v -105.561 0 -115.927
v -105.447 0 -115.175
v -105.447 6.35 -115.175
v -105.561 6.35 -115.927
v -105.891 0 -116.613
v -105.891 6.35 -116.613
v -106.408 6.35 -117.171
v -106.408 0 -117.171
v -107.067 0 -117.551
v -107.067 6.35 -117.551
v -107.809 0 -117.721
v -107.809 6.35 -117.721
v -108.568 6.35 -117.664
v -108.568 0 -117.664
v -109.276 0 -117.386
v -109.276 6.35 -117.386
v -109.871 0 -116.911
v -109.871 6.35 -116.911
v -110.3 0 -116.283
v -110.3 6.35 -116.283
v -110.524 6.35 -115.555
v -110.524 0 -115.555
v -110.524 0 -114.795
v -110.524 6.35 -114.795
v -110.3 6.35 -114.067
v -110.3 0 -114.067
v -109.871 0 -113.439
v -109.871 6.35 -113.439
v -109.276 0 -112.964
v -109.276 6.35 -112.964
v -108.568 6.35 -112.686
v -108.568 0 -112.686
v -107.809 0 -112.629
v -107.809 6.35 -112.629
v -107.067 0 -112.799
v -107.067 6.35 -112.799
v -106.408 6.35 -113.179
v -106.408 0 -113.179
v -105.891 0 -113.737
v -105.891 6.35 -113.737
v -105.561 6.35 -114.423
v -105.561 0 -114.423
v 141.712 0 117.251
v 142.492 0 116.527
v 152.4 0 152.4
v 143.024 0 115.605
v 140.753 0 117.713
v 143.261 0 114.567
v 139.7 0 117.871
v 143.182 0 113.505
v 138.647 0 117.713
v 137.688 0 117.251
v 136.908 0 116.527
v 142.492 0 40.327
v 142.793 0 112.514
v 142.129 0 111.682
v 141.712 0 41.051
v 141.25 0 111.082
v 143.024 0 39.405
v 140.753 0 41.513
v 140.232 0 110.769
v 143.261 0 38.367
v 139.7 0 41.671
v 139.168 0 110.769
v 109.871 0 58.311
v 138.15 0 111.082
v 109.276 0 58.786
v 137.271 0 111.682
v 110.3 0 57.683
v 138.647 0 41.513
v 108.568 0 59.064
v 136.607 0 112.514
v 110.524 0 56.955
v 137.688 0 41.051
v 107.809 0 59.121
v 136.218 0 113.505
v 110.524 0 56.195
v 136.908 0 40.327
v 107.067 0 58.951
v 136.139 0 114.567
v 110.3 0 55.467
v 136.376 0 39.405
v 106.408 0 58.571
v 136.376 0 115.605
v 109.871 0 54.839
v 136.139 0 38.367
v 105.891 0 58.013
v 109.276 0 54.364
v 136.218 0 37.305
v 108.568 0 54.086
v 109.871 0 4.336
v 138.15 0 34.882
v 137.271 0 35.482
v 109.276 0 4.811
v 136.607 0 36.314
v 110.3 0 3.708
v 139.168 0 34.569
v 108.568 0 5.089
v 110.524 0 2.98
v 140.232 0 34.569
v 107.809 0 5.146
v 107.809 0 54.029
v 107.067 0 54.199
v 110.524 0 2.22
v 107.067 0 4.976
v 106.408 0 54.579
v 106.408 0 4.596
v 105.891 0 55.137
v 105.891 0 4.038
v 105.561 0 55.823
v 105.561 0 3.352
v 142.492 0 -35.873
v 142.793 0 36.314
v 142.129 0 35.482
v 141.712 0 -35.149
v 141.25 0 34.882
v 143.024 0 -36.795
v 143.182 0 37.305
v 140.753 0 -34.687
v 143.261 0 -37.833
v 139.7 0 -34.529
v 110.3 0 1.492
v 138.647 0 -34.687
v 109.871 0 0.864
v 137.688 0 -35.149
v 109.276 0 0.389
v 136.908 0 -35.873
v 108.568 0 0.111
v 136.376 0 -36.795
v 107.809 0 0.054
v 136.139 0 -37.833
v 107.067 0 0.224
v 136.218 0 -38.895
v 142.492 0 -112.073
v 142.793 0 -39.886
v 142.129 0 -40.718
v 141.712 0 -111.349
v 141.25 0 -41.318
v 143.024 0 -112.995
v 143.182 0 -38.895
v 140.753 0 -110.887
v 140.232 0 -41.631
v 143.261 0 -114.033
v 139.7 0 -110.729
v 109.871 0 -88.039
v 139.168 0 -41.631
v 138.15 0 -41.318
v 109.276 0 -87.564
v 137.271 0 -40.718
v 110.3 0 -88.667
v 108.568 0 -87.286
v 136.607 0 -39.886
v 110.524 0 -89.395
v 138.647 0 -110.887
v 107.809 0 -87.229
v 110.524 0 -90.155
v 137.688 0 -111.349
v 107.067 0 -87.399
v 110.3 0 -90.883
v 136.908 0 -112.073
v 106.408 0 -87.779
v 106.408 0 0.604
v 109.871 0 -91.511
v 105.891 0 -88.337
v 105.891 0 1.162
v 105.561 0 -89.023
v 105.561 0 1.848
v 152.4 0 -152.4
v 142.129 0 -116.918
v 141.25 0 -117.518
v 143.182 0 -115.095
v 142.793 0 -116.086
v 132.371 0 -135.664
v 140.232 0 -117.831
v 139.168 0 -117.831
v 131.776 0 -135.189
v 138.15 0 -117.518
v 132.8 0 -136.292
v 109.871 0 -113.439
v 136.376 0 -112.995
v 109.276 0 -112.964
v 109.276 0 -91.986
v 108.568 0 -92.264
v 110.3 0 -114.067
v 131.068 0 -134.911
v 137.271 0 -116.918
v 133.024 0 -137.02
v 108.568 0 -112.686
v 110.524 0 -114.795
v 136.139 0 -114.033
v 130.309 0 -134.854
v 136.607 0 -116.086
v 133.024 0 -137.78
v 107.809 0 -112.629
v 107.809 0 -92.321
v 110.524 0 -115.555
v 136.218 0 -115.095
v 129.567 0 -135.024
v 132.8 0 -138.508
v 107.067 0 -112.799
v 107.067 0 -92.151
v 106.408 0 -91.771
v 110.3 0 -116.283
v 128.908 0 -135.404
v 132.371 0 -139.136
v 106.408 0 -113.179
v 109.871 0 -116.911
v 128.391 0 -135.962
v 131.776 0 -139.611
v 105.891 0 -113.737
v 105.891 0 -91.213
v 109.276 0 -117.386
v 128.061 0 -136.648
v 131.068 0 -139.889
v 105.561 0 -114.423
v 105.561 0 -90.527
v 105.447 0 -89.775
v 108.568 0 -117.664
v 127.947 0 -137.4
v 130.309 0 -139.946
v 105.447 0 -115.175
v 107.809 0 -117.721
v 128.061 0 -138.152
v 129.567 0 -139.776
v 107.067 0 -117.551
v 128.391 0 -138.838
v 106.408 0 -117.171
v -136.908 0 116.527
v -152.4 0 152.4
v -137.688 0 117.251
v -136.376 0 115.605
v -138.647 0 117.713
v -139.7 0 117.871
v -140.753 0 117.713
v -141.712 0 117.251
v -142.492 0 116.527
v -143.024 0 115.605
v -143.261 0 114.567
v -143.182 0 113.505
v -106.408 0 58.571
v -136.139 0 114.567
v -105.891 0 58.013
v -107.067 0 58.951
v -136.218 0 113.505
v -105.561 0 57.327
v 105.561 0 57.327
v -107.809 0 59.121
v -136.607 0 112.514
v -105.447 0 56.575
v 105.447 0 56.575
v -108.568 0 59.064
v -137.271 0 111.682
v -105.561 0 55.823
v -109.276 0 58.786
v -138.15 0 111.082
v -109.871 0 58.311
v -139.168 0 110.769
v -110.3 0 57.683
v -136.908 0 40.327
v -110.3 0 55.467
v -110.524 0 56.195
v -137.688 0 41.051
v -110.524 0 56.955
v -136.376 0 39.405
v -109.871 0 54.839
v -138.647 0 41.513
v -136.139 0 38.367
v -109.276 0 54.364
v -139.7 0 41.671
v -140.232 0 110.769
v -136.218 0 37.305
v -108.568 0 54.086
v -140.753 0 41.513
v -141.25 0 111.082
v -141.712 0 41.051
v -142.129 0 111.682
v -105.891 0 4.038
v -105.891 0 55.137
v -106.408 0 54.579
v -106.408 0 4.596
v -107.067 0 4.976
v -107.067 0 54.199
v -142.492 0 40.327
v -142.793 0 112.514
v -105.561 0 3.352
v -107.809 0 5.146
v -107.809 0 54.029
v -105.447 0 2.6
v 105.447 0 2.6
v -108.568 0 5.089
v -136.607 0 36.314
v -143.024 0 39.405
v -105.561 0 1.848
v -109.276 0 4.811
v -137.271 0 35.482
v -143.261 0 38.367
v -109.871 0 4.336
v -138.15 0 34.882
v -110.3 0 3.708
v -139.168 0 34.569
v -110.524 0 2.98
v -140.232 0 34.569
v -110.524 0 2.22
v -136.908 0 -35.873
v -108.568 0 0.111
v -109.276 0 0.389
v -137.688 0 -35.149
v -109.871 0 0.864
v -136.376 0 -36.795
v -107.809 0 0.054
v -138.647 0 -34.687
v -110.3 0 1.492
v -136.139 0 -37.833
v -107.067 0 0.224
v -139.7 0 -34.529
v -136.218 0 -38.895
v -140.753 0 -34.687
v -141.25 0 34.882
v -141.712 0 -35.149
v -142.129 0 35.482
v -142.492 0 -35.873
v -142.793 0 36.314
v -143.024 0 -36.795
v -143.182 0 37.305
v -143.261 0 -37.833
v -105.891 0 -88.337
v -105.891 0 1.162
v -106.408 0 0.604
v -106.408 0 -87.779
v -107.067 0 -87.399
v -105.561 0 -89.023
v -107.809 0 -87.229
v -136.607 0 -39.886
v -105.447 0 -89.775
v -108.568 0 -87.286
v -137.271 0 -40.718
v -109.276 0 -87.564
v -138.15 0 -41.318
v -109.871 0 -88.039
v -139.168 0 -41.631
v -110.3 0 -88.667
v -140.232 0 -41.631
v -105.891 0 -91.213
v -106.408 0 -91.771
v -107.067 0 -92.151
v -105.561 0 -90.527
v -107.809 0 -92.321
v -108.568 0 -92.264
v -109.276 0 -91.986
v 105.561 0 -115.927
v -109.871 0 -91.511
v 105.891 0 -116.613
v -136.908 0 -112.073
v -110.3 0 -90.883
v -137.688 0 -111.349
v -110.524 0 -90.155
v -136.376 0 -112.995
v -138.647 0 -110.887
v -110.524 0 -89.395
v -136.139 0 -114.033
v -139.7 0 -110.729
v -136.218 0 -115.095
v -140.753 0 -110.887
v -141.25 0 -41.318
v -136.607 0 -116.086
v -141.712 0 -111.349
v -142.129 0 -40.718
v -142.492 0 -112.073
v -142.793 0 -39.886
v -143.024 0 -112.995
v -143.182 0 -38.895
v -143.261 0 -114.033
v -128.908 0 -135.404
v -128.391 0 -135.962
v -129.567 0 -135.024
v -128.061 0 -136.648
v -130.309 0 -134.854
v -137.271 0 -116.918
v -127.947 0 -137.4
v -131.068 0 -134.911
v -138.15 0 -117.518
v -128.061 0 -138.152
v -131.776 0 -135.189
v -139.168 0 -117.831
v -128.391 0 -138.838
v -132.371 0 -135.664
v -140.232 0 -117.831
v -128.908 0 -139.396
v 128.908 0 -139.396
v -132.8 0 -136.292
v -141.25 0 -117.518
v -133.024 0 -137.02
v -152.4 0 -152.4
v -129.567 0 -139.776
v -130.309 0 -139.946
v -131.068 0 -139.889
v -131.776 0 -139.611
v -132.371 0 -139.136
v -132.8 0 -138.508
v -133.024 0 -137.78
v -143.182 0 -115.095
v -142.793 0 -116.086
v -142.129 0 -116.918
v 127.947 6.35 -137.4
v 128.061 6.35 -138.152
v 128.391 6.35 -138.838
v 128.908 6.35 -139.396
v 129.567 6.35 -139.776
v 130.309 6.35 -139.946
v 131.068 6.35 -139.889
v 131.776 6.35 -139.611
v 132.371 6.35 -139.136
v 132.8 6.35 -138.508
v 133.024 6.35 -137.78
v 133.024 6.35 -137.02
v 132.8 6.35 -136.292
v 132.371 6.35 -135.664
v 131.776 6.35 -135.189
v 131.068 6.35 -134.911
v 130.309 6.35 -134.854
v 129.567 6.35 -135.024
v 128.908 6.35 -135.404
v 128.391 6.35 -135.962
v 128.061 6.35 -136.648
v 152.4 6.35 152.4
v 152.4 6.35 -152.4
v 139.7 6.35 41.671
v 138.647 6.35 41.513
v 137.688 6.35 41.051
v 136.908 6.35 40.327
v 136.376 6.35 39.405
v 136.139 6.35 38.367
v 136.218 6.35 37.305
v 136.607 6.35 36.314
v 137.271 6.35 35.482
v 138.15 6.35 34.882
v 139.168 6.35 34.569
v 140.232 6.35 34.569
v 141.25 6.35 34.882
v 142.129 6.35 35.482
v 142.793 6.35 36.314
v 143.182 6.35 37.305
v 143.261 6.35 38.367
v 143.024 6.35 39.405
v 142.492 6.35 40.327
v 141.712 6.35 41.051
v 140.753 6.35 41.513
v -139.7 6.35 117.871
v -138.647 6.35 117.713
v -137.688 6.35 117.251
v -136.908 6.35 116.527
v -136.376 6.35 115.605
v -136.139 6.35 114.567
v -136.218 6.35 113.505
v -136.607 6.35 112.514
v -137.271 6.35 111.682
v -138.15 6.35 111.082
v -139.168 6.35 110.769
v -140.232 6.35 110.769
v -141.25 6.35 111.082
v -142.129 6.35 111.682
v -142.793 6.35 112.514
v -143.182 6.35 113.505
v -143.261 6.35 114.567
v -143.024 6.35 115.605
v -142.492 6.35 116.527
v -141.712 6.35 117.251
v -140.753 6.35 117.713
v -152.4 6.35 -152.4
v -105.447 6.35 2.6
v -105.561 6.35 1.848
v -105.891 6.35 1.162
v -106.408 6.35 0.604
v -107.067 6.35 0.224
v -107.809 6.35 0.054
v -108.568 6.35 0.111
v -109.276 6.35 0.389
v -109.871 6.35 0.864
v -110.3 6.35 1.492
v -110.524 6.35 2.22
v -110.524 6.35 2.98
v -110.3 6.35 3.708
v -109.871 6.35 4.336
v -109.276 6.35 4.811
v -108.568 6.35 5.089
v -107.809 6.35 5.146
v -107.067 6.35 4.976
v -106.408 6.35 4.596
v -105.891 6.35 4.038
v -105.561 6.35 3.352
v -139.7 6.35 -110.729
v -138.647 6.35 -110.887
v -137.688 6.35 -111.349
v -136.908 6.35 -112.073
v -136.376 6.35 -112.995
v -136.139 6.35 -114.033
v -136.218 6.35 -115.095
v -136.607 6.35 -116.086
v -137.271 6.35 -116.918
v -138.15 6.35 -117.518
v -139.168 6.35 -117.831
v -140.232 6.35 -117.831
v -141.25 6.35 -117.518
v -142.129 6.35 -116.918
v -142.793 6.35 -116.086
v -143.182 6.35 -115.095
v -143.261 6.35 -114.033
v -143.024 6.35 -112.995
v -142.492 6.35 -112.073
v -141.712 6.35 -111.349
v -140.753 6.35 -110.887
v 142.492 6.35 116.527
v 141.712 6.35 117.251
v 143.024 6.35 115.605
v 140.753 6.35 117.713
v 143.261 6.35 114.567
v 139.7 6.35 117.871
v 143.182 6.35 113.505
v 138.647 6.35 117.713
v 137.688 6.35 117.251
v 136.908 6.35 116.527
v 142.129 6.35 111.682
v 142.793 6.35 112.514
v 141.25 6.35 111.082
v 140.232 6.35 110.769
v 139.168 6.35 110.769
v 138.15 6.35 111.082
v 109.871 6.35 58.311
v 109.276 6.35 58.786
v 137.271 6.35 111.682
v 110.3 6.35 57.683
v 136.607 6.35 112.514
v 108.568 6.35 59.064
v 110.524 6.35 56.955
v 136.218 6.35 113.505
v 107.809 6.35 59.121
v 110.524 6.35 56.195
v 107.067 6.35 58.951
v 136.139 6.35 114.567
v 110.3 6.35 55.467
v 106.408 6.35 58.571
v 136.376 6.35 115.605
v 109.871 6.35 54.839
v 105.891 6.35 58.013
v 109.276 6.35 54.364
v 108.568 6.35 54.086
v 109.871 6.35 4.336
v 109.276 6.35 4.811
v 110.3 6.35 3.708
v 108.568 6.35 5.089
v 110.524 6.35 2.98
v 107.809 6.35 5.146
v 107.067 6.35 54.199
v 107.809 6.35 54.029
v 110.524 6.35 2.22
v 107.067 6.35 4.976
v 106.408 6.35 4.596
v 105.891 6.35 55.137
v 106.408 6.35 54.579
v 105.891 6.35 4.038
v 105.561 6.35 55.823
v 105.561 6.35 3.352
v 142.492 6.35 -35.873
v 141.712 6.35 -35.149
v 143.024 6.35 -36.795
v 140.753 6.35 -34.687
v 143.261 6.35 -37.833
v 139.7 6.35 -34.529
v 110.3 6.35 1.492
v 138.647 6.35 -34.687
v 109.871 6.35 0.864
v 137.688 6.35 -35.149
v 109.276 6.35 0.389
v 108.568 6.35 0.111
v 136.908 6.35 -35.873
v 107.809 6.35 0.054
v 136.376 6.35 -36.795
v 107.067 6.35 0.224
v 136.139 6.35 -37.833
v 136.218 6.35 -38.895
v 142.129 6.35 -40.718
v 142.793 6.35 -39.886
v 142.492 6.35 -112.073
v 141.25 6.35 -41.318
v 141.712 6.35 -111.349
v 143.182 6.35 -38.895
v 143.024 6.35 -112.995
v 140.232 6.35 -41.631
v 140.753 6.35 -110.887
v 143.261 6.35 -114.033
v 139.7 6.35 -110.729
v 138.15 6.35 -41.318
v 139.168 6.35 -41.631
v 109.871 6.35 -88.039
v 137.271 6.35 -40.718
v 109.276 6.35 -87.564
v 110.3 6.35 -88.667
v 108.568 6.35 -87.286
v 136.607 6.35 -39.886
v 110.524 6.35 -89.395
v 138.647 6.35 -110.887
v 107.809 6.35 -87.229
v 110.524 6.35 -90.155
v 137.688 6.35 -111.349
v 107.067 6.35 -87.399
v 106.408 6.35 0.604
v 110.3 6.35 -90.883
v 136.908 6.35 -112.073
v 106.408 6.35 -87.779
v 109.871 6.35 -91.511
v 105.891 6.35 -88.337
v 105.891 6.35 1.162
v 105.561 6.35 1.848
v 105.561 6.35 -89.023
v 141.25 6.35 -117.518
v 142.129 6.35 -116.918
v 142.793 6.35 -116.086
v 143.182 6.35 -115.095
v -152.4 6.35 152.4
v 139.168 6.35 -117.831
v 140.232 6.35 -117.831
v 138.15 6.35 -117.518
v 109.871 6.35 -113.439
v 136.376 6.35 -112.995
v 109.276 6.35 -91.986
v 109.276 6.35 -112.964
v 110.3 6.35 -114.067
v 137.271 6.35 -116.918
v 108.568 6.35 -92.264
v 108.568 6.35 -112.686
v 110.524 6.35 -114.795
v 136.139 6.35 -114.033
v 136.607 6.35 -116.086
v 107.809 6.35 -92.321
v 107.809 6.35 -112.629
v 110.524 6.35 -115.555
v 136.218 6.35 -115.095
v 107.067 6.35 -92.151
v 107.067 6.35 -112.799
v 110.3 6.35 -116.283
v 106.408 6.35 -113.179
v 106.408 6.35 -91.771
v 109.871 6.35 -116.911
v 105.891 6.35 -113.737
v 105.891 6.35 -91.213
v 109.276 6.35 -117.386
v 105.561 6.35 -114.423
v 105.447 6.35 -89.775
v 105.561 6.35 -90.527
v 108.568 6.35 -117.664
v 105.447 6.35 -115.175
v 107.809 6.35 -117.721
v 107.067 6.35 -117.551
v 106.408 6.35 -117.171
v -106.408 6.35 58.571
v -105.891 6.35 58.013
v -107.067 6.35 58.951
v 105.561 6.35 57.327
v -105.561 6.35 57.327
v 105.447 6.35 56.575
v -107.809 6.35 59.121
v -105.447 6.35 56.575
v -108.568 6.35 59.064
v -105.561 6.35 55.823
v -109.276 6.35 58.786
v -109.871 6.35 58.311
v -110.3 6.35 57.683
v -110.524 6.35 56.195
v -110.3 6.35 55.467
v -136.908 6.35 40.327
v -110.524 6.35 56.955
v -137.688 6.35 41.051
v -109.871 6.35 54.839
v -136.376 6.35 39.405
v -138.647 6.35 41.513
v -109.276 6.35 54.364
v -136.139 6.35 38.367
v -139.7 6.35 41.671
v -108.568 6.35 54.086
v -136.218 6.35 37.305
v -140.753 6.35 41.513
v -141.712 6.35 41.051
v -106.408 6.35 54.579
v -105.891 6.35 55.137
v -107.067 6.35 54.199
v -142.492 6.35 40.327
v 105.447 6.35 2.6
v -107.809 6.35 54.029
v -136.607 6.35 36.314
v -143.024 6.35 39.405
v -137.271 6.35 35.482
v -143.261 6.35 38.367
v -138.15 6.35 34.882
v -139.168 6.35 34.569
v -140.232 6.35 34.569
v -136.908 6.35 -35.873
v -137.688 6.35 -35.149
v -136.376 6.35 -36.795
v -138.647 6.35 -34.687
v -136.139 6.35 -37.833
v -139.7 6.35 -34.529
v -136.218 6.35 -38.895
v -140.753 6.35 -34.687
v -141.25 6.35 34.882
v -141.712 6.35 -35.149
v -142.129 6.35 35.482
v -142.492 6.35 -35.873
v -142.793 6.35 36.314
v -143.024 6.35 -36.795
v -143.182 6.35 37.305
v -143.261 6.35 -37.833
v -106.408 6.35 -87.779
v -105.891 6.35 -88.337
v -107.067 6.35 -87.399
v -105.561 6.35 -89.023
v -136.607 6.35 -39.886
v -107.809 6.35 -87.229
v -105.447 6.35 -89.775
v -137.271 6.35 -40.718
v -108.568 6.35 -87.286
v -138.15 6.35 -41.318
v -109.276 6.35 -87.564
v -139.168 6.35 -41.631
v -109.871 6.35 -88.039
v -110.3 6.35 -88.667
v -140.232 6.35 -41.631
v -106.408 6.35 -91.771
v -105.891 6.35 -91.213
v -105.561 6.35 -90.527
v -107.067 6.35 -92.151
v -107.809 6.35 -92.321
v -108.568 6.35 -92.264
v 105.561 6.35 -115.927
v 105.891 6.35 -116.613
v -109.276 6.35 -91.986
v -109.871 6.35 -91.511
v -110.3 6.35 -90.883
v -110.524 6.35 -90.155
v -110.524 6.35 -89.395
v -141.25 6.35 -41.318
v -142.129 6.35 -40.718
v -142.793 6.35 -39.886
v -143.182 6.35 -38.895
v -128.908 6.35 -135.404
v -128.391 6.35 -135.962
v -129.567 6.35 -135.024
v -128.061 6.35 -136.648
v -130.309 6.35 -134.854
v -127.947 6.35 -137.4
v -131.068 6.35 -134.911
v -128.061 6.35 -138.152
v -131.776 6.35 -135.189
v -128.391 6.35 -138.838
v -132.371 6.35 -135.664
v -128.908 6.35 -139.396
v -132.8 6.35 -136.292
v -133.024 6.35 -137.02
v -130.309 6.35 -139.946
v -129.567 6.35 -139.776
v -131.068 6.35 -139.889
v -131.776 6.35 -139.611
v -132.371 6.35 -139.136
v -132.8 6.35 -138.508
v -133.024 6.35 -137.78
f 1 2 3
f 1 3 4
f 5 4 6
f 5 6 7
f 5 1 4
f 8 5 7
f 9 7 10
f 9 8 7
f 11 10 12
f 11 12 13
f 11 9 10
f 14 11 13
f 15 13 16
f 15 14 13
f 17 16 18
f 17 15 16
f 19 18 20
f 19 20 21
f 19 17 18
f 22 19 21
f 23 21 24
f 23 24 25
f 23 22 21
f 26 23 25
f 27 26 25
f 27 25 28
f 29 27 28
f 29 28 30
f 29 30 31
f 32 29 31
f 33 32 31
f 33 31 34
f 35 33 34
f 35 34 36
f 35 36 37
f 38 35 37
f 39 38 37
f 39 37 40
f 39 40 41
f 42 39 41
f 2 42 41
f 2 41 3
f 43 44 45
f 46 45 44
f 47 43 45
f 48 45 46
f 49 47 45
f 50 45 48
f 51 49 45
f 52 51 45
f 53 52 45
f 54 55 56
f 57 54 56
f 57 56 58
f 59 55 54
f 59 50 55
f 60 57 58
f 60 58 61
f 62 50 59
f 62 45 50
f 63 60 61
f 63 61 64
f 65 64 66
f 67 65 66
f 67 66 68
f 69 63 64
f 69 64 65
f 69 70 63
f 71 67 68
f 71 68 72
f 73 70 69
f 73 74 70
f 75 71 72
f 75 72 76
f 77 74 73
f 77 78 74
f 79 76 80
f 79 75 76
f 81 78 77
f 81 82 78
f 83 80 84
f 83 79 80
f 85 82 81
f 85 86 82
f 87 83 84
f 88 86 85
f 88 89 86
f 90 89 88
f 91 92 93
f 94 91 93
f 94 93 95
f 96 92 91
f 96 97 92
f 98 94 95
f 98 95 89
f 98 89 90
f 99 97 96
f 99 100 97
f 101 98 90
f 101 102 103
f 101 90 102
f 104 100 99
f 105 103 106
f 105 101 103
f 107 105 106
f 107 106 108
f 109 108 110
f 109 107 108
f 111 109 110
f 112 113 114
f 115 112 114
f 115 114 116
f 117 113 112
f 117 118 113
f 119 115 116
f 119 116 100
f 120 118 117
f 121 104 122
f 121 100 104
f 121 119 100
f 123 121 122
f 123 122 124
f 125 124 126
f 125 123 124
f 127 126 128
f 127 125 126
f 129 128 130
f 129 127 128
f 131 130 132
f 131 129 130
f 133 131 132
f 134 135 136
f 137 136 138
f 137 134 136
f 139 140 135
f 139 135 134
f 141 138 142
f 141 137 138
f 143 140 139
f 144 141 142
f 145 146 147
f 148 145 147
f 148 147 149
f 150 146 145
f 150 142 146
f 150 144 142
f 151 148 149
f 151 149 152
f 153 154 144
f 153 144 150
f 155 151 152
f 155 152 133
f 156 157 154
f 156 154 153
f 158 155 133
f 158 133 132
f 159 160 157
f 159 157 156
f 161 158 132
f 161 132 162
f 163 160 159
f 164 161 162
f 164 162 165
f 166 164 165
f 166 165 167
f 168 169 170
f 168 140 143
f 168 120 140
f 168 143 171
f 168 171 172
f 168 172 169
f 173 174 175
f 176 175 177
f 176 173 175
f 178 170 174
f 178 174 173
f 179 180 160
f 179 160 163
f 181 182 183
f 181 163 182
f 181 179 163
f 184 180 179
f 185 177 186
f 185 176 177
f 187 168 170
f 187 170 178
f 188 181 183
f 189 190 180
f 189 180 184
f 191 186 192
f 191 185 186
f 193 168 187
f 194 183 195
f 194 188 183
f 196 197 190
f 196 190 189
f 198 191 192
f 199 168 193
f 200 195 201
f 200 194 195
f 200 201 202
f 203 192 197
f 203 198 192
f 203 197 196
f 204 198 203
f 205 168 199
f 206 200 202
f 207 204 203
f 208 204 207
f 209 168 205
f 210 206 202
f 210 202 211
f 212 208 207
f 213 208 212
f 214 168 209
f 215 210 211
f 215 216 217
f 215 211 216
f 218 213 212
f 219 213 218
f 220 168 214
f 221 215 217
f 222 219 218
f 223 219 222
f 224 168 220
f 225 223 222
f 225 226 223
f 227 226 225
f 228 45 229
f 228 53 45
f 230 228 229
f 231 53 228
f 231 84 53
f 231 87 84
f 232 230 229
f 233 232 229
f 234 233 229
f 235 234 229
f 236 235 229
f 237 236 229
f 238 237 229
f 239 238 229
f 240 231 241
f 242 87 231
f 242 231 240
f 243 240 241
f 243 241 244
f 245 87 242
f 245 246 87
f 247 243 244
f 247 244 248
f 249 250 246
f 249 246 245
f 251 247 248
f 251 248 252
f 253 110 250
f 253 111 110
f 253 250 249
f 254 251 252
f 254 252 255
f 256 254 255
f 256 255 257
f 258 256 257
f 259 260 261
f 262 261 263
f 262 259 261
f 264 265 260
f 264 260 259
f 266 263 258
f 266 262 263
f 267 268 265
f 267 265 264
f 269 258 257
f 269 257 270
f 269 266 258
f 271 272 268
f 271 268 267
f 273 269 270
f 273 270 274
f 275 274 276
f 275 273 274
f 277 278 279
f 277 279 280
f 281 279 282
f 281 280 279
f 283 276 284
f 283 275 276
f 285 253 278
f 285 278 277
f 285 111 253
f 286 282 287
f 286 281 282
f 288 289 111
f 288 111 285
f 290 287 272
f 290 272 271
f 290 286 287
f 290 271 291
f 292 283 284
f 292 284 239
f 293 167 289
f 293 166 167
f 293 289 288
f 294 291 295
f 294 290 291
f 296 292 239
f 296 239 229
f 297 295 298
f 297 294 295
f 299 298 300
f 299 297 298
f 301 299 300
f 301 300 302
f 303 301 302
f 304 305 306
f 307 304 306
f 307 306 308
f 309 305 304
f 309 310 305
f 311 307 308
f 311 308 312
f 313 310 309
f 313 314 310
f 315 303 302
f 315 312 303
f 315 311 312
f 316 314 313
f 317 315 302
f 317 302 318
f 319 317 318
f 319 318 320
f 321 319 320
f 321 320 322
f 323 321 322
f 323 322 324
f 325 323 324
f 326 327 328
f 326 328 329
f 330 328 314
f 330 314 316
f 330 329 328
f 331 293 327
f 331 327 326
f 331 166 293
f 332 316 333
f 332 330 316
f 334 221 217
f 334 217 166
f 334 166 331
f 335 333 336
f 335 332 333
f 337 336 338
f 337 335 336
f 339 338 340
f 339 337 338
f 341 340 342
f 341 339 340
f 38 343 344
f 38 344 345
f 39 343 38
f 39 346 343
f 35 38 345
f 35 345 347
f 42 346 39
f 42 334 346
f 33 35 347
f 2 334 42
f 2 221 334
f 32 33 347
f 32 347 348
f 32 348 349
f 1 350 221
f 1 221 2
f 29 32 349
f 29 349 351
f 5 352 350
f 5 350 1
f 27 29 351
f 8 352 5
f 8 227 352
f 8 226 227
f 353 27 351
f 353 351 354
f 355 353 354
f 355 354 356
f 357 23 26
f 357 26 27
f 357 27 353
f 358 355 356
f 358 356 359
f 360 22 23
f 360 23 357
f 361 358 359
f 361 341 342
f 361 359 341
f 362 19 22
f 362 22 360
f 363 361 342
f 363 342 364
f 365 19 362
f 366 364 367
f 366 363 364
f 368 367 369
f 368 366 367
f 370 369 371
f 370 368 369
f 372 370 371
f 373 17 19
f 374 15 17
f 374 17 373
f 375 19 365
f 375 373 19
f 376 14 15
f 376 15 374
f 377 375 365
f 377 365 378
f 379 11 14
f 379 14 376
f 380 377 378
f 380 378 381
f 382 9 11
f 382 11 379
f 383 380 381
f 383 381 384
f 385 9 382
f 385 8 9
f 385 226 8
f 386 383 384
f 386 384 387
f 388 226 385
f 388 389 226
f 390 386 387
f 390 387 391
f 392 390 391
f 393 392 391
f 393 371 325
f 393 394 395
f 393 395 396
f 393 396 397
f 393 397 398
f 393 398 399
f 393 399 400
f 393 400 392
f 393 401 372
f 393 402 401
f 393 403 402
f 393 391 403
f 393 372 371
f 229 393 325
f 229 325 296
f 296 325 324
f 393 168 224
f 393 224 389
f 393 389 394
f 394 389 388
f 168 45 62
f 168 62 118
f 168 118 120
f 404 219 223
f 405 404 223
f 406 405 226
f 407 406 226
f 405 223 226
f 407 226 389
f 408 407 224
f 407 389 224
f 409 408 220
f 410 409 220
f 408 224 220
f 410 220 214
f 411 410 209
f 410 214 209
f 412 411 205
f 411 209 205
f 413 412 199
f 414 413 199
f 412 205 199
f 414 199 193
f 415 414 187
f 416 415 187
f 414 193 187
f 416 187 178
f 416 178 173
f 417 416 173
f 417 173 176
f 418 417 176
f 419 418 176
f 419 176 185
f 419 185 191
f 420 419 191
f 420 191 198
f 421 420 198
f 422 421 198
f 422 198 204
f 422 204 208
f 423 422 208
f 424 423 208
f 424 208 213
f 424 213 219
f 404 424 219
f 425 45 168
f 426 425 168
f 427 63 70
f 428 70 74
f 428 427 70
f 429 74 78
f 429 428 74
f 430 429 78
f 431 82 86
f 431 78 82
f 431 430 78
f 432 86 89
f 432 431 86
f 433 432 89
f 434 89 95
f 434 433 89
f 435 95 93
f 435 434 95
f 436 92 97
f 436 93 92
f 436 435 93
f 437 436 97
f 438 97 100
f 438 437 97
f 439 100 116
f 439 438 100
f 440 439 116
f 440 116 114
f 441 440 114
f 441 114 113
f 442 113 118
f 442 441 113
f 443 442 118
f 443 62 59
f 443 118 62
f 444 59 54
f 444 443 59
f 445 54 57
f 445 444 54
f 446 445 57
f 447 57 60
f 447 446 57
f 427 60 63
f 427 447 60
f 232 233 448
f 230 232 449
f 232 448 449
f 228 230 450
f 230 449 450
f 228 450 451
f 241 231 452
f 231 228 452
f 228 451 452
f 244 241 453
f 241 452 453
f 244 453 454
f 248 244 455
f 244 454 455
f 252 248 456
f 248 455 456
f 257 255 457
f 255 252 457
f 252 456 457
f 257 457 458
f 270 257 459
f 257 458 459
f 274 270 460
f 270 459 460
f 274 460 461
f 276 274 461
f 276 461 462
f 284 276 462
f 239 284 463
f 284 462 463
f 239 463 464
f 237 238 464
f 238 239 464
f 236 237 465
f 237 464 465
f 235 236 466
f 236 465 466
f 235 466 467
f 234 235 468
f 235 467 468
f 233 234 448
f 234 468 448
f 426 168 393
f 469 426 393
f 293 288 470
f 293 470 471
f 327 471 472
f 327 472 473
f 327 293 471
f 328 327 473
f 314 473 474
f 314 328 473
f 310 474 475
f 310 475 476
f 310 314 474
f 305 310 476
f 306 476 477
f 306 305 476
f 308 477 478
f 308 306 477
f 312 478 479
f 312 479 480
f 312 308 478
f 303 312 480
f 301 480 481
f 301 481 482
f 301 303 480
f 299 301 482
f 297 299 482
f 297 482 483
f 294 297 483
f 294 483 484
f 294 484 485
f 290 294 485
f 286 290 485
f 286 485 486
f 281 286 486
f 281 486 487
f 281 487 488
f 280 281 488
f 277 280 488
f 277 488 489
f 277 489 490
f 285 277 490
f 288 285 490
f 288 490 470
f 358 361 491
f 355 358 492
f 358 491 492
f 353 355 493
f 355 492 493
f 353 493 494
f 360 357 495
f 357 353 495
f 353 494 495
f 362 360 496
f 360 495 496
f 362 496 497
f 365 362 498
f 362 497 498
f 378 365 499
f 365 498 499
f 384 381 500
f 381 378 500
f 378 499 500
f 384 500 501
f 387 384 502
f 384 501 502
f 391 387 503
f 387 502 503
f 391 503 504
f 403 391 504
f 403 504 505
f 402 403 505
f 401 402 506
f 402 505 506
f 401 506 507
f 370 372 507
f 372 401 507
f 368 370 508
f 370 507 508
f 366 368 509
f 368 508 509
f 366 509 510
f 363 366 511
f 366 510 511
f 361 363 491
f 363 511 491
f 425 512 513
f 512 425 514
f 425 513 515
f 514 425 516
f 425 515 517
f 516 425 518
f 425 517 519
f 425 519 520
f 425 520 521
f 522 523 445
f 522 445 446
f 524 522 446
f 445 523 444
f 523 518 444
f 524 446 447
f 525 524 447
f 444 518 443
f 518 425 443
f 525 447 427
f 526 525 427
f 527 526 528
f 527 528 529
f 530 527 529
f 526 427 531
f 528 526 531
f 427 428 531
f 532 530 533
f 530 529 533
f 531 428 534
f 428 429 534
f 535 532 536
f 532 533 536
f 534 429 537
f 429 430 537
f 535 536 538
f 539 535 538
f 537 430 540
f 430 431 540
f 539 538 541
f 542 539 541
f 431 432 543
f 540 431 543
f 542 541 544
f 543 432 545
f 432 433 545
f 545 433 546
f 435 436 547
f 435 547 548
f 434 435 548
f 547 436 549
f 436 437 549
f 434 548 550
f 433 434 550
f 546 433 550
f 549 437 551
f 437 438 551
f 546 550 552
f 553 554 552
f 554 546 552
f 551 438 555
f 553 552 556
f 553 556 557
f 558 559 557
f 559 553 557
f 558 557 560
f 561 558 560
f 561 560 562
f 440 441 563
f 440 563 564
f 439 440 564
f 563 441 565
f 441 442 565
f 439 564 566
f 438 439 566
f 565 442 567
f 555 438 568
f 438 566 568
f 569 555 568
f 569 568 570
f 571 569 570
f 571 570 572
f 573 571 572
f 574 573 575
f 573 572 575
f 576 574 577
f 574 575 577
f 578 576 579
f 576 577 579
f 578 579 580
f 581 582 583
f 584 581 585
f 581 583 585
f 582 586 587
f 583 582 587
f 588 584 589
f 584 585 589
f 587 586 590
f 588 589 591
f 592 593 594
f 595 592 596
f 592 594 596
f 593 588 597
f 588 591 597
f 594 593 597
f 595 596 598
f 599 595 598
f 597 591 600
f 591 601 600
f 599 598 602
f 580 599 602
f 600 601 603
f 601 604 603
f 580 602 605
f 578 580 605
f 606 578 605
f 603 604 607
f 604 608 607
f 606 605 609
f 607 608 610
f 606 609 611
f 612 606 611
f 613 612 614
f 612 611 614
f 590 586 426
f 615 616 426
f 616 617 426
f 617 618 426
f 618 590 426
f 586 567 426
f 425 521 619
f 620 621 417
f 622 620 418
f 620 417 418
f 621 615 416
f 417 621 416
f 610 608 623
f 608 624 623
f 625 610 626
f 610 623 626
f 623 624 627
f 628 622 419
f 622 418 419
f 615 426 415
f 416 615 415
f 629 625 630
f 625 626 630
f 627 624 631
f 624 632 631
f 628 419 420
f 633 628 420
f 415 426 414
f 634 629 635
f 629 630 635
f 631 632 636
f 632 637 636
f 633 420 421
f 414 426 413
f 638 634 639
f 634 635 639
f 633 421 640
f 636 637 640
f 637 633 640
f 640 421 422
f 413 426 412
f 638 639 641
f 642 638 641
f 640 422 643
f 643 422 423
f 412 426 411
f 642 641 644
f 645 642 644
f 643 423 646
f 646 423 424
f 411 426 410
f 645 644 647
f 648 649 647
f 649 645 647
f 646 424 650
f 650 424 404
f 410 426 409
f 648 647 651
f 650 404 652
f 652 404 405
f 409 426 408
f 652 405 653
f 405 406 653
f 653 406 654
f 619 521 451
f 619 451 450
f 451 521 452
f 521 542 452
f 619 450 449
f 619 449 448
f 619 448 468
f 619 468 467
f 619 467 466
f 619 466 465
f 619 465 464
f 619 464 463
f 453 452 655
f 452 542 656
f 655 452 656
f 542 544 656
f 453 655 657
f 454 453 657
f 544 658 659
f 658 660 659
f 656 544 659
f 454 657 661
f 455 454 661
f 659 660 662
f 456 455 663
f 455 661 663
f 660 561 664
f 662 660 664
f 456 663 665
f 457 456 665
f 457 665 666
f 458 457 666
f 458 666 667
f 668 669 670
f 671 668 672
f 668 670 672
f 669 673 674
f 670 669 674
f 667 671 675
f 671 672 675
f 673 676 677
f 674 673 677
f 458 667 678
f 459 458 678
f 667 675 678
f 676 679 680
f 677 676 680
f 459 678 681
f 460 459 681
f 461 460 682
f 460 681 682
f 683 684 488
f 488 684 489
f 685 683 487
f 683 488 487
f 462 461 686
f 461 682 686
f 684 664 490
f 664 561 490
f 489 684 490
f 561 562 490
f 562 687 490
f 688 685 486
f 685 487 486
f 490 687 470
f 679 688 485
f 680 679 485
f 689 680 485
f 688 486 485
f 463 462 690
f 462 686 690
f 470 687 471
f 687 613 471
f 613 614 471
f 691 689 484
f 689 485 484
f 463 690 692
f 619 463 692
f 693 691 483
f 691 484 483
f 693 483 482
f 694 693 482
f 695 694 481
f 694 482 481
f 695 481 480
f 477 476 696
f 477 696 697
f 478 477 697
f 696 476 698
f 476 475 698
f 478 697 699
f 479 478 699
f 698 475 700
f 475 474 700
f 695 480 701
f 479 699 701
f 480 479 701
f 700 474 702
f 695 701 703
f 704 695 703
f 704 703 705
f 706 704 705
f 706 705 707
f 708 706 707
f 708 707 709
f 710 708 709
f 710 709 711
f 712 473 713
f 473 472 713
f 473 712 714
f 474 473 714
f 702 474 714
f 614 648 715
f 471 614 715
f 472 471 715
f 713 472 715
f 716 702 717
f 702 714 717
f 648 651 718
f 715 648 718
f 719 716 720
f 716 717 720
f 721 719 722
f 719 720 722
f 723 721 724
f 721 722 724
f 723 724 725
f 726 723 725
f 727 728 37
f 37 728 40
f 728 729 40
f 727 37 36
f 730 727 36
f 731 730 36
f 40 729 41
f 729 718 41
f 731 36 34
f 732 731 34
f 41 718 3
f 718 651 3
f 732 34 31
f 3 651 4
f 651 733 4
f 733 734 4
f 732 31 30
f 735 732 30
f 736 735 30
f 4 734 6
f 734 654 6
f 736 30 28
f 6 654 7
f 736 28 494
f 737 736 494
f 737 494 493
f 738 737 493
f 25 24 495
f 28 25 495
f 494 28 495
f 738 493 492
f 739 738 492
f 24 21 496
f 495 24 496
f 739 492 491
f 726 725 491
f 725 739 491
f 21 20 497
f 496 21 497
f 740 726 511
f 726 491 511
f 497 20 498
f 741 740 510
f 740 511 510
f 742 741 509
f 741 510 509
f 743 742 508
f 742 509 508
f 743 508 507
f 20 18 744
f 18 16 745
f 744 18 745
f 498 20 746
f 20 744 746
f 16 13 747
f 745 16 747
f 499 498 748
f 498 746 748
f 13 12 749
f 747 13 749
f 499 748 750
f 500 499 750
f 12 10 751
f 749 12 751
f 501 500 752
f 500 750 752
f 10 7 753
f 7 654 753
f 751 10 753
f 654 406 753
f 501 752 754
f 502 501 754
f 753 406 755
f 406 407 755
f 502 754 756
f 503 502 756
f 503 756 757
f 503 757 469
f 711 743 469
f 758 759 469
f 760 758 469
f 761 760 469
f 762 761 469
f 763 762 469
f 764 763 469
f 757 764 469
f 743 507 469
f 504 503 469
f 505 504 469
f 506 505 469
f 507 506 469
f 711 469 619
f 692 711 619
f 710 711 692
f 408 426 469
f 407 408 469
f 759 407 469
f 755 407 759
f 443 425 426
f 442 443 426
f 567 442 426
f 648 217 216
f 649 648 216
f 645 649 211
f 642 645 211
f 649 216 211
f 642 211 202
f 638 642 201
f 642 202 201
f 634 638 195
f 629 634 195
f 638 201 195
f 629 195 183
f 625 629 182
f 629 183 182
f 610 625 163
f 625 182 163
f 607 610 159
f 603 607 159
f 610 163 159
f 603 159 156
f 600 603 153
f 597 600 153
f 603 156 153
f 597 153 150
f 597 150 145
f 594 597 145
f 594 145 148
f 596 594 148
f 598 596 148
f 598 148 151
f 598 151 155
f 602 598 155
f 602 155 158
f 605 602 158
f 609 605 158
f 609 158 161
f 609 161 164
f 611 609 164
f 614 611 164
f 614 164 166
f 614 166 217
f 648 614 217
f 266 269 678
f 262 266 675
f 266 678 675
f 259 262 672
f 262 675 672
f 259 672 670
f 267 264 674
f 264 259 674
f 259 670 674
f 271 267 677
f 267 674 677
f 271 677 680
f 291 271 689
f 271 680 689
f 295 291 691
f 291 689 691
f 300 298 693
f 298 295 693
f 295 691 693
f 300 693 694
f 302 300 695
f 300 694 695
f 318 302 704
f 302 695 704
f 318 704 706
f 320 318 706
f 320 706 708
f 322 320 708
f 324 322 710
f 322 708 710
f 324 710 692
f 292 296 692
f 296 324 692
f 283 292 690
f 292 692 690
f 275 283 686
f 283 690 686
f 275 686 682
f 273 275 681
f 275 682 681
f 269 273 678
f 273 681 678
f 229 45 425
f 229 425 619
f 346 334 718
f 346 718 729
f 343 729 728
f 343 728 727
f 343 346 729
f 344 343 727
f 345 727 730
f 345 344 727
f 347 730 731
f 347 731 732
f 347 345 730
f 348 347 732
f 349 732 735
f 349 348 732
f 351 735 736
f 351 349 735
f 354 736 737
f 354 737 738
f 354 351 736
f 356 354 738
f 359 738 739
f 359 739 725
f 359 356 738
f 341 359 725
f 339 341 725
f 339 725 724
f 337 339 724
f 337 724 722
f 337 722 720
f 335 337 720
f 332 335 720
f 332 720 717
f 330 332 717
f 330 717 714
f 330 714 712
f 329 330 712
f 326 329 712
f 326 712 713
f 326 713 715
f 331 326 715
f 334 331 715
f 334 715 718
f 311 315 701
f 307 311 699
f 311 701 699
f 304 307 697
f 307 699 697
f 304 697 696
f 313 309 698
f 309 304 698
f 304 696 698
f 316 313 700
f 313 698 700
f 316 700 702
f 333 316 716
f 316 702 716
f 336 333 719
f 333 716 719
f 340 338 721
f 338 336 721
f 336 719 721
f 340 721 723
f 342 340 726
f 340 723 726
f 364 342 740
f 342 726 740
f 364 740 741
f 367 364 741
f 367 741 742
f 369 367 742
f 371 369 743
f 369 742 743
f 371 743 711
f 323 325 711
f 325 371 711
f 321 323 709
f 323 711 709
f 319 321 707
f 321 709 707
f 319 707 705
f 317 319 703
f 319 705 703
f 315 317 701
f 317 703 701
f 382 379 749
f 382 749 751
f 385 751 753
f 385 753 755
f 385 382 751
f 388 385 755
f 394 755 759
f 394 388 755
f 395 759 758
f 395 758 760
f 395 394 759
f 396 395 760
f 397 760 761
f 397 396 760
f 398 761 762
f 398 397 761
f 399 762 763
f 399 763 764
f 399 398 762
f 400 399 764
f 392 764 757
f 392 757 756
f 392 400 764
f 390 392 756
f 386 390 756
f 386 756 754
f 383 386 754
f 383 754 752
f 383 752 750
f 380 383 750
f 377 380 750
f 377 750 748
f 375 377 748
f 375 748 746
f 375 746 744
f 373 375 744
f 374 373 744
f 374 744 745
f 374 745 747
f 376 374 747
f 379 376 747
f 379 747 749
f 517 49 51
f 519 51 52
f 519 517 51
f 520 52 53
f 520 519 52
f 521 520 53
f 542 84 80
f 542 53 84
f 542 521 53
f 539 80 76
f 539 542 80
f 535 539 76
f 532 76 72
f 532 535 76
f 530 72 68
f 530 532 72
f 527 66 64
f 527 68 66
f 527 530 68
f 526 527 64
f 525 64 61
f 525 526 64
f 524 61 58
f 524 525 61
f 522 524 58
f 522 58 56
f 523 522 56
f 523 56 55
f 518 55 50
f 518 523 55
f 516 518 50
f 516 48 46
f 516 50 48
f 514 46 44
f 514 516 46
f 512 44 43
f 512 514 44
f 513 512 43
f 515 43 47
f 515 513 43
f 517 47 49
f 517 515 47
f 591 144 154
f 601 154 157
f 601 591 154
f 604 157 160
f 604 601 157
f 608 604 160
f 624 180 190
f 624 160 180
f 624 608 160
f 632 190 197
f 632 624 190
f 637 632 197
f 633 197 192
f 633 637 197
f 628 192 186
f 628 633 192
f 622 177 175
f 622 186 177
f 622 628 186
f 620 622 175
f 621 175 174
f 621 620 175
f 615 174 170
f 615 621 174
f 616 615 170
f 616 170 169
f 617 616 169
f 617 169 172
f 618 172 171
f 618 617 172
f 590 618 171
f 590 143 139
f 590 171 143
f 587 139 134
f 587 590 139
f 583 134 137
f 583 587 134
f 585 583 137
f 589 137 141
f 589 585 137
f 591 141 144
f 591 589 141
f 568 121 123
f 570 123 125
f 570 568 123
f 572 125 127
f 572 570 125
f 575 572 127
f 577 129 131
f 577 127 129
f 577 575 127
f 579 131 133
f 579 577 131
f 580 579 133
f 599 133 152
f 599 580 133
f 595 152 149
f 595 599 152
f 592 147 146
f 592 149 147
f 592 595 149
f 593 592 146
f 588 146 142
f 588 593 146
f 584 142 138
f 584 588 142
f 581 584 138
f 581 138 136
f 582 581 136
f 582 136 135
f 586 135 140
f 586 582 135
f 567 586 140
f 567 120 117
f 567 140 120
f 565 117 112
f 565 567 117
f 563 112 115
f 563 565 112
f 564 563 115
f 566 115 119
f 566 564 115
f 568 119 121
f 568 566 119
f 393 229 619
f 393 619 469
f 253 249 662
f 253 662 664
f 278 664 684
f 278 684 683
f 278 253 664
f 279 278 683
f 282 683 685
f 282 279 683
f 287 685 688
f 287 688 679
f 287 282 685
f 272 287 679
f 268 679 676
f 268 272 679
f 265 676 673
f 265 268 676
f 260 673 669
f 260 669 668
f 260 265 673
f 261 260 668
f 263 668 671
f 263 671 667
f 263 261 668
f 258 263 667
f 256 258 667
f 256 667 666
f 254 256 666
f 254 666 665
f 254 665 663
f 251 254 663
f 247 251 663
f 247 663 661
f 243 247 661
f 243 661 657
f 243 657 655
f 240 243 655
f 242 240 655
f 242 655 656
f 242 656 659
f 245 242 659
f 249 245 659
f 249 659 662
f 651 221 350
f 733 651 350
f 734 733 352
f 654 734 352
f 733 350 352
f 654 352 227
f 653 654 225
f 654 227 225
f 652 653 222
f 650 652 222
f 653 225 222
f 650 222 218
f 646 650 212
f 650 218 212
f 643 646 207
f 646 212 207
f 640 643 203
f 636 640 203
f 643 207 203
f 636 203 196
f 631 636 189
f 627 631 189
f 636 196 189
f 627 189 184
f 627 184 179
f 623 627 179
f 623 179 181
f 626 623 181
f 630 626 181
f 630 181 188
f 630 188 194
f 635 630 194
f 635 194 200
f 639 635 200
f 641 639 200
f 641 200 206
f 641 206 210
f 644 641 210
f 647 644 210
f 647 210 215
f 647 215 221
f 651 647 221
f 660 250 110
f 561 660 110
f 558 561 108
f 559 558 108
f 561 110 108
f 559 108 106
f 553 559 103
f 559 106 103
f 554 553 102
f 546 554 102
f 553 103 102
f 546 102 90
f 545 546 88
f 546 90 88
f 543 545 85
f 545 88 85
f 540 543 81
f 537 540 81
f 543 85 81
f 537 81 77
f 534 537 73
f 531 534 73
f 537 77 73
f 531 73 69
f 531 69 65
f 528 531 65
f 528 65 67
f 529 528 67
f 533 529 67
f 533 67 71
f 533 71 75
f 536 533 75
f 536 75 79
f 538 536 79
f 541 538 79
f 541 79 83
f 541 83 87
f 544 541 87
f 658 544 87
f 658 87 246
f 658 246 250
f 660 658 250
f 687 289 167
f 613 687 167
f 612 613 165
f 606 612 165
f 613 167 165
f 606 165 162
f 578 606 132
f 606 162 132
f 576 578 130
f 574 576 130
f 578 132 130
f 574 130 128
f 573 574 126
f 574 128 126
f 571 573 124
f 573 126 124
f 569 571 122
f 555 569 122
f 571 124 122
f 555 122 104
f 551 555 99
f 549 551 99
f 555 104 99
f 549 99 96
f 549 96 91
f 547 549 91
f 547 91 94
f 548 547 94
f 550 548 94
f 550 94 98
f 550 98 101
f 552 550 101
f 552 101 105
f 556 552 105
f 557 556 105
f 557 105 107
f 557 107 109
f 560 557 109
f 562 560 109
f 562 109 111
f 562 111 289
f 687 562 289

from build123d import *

# Parameters (mm, degrees)
SKETCH1_W               = 152.4
SKETCH1_H               = 304.8
BOSS_EXTRUDE1_DEPTH     = 6.35
F_1_4_20_TAPPED_HOLE1_D = 5.1054
LPATTERN1_COUNT         = 4
LPATTERN1_PITCH         = 76.2


with BuildPart() as part:
    # Sketch1 → Boss-Extrude1 (new body)
    with BuildSketch(Plane(origin=(0, 0, 0), x_dir=(1, 0, 0), z_dir=(0, 1, 0))):
        with Locations((76.2, 0)):
            Rectangle(SKETCH1_W, SKETCH1_H)
    extrude(amount=BOSS_EXTRUDE1_DEPTH)

    # 1/4-20 Tapped Hole1 (through all)
    with Locations(Plane(origin=(0, 6.35, 0), x_dir=(1, 0, 0), z_dir=(0, 1, 0))):
        with Locations((130.5, 137.4), (108, 115.175), (108, -2.6), (108, -56.575), (108, 89.775)):
            Hole(F_1_4_20_TAPPED_HOLE1_D / 2)

    # Sketch4 → 1/4 Clearance Hole2 (revolve, cut)
    with BuildSketch(Plane(origin=(139.7, 6.35, -114.3), x_dir=(0, 0, 1), z_dir=(1, 0, 0))):
        Polygon((0, 0), (0, 14.845817477), (3.57124, 12.7), (3.57124, 0), align=None)
    f_1_4_clearance_hole2 = revolve(axis=Axis((139.7, 12.7, -114.3), (0, -1, 0)), mode=Mode.SUBTRACT)

    # LPattern1: 1/4 Clearance Hole2 ×4
    with Locations(*[(0, 0, i * LPATTERN1_PITCH) for i in range(1, LPATTERN1_COUNT)]):
        add(f_1_4_clearance_hole2, mode=Mode.SUBTRACT)

    # Mirror1: part across plane


with BuildPart() as part_1:
    add(part.part)
    add(part.part.mirror(Plane(origin=(0, 0, 0), x_dir=(0, 0, 1), z_dir=(1, 0, 0))))


solid = part_1.part
